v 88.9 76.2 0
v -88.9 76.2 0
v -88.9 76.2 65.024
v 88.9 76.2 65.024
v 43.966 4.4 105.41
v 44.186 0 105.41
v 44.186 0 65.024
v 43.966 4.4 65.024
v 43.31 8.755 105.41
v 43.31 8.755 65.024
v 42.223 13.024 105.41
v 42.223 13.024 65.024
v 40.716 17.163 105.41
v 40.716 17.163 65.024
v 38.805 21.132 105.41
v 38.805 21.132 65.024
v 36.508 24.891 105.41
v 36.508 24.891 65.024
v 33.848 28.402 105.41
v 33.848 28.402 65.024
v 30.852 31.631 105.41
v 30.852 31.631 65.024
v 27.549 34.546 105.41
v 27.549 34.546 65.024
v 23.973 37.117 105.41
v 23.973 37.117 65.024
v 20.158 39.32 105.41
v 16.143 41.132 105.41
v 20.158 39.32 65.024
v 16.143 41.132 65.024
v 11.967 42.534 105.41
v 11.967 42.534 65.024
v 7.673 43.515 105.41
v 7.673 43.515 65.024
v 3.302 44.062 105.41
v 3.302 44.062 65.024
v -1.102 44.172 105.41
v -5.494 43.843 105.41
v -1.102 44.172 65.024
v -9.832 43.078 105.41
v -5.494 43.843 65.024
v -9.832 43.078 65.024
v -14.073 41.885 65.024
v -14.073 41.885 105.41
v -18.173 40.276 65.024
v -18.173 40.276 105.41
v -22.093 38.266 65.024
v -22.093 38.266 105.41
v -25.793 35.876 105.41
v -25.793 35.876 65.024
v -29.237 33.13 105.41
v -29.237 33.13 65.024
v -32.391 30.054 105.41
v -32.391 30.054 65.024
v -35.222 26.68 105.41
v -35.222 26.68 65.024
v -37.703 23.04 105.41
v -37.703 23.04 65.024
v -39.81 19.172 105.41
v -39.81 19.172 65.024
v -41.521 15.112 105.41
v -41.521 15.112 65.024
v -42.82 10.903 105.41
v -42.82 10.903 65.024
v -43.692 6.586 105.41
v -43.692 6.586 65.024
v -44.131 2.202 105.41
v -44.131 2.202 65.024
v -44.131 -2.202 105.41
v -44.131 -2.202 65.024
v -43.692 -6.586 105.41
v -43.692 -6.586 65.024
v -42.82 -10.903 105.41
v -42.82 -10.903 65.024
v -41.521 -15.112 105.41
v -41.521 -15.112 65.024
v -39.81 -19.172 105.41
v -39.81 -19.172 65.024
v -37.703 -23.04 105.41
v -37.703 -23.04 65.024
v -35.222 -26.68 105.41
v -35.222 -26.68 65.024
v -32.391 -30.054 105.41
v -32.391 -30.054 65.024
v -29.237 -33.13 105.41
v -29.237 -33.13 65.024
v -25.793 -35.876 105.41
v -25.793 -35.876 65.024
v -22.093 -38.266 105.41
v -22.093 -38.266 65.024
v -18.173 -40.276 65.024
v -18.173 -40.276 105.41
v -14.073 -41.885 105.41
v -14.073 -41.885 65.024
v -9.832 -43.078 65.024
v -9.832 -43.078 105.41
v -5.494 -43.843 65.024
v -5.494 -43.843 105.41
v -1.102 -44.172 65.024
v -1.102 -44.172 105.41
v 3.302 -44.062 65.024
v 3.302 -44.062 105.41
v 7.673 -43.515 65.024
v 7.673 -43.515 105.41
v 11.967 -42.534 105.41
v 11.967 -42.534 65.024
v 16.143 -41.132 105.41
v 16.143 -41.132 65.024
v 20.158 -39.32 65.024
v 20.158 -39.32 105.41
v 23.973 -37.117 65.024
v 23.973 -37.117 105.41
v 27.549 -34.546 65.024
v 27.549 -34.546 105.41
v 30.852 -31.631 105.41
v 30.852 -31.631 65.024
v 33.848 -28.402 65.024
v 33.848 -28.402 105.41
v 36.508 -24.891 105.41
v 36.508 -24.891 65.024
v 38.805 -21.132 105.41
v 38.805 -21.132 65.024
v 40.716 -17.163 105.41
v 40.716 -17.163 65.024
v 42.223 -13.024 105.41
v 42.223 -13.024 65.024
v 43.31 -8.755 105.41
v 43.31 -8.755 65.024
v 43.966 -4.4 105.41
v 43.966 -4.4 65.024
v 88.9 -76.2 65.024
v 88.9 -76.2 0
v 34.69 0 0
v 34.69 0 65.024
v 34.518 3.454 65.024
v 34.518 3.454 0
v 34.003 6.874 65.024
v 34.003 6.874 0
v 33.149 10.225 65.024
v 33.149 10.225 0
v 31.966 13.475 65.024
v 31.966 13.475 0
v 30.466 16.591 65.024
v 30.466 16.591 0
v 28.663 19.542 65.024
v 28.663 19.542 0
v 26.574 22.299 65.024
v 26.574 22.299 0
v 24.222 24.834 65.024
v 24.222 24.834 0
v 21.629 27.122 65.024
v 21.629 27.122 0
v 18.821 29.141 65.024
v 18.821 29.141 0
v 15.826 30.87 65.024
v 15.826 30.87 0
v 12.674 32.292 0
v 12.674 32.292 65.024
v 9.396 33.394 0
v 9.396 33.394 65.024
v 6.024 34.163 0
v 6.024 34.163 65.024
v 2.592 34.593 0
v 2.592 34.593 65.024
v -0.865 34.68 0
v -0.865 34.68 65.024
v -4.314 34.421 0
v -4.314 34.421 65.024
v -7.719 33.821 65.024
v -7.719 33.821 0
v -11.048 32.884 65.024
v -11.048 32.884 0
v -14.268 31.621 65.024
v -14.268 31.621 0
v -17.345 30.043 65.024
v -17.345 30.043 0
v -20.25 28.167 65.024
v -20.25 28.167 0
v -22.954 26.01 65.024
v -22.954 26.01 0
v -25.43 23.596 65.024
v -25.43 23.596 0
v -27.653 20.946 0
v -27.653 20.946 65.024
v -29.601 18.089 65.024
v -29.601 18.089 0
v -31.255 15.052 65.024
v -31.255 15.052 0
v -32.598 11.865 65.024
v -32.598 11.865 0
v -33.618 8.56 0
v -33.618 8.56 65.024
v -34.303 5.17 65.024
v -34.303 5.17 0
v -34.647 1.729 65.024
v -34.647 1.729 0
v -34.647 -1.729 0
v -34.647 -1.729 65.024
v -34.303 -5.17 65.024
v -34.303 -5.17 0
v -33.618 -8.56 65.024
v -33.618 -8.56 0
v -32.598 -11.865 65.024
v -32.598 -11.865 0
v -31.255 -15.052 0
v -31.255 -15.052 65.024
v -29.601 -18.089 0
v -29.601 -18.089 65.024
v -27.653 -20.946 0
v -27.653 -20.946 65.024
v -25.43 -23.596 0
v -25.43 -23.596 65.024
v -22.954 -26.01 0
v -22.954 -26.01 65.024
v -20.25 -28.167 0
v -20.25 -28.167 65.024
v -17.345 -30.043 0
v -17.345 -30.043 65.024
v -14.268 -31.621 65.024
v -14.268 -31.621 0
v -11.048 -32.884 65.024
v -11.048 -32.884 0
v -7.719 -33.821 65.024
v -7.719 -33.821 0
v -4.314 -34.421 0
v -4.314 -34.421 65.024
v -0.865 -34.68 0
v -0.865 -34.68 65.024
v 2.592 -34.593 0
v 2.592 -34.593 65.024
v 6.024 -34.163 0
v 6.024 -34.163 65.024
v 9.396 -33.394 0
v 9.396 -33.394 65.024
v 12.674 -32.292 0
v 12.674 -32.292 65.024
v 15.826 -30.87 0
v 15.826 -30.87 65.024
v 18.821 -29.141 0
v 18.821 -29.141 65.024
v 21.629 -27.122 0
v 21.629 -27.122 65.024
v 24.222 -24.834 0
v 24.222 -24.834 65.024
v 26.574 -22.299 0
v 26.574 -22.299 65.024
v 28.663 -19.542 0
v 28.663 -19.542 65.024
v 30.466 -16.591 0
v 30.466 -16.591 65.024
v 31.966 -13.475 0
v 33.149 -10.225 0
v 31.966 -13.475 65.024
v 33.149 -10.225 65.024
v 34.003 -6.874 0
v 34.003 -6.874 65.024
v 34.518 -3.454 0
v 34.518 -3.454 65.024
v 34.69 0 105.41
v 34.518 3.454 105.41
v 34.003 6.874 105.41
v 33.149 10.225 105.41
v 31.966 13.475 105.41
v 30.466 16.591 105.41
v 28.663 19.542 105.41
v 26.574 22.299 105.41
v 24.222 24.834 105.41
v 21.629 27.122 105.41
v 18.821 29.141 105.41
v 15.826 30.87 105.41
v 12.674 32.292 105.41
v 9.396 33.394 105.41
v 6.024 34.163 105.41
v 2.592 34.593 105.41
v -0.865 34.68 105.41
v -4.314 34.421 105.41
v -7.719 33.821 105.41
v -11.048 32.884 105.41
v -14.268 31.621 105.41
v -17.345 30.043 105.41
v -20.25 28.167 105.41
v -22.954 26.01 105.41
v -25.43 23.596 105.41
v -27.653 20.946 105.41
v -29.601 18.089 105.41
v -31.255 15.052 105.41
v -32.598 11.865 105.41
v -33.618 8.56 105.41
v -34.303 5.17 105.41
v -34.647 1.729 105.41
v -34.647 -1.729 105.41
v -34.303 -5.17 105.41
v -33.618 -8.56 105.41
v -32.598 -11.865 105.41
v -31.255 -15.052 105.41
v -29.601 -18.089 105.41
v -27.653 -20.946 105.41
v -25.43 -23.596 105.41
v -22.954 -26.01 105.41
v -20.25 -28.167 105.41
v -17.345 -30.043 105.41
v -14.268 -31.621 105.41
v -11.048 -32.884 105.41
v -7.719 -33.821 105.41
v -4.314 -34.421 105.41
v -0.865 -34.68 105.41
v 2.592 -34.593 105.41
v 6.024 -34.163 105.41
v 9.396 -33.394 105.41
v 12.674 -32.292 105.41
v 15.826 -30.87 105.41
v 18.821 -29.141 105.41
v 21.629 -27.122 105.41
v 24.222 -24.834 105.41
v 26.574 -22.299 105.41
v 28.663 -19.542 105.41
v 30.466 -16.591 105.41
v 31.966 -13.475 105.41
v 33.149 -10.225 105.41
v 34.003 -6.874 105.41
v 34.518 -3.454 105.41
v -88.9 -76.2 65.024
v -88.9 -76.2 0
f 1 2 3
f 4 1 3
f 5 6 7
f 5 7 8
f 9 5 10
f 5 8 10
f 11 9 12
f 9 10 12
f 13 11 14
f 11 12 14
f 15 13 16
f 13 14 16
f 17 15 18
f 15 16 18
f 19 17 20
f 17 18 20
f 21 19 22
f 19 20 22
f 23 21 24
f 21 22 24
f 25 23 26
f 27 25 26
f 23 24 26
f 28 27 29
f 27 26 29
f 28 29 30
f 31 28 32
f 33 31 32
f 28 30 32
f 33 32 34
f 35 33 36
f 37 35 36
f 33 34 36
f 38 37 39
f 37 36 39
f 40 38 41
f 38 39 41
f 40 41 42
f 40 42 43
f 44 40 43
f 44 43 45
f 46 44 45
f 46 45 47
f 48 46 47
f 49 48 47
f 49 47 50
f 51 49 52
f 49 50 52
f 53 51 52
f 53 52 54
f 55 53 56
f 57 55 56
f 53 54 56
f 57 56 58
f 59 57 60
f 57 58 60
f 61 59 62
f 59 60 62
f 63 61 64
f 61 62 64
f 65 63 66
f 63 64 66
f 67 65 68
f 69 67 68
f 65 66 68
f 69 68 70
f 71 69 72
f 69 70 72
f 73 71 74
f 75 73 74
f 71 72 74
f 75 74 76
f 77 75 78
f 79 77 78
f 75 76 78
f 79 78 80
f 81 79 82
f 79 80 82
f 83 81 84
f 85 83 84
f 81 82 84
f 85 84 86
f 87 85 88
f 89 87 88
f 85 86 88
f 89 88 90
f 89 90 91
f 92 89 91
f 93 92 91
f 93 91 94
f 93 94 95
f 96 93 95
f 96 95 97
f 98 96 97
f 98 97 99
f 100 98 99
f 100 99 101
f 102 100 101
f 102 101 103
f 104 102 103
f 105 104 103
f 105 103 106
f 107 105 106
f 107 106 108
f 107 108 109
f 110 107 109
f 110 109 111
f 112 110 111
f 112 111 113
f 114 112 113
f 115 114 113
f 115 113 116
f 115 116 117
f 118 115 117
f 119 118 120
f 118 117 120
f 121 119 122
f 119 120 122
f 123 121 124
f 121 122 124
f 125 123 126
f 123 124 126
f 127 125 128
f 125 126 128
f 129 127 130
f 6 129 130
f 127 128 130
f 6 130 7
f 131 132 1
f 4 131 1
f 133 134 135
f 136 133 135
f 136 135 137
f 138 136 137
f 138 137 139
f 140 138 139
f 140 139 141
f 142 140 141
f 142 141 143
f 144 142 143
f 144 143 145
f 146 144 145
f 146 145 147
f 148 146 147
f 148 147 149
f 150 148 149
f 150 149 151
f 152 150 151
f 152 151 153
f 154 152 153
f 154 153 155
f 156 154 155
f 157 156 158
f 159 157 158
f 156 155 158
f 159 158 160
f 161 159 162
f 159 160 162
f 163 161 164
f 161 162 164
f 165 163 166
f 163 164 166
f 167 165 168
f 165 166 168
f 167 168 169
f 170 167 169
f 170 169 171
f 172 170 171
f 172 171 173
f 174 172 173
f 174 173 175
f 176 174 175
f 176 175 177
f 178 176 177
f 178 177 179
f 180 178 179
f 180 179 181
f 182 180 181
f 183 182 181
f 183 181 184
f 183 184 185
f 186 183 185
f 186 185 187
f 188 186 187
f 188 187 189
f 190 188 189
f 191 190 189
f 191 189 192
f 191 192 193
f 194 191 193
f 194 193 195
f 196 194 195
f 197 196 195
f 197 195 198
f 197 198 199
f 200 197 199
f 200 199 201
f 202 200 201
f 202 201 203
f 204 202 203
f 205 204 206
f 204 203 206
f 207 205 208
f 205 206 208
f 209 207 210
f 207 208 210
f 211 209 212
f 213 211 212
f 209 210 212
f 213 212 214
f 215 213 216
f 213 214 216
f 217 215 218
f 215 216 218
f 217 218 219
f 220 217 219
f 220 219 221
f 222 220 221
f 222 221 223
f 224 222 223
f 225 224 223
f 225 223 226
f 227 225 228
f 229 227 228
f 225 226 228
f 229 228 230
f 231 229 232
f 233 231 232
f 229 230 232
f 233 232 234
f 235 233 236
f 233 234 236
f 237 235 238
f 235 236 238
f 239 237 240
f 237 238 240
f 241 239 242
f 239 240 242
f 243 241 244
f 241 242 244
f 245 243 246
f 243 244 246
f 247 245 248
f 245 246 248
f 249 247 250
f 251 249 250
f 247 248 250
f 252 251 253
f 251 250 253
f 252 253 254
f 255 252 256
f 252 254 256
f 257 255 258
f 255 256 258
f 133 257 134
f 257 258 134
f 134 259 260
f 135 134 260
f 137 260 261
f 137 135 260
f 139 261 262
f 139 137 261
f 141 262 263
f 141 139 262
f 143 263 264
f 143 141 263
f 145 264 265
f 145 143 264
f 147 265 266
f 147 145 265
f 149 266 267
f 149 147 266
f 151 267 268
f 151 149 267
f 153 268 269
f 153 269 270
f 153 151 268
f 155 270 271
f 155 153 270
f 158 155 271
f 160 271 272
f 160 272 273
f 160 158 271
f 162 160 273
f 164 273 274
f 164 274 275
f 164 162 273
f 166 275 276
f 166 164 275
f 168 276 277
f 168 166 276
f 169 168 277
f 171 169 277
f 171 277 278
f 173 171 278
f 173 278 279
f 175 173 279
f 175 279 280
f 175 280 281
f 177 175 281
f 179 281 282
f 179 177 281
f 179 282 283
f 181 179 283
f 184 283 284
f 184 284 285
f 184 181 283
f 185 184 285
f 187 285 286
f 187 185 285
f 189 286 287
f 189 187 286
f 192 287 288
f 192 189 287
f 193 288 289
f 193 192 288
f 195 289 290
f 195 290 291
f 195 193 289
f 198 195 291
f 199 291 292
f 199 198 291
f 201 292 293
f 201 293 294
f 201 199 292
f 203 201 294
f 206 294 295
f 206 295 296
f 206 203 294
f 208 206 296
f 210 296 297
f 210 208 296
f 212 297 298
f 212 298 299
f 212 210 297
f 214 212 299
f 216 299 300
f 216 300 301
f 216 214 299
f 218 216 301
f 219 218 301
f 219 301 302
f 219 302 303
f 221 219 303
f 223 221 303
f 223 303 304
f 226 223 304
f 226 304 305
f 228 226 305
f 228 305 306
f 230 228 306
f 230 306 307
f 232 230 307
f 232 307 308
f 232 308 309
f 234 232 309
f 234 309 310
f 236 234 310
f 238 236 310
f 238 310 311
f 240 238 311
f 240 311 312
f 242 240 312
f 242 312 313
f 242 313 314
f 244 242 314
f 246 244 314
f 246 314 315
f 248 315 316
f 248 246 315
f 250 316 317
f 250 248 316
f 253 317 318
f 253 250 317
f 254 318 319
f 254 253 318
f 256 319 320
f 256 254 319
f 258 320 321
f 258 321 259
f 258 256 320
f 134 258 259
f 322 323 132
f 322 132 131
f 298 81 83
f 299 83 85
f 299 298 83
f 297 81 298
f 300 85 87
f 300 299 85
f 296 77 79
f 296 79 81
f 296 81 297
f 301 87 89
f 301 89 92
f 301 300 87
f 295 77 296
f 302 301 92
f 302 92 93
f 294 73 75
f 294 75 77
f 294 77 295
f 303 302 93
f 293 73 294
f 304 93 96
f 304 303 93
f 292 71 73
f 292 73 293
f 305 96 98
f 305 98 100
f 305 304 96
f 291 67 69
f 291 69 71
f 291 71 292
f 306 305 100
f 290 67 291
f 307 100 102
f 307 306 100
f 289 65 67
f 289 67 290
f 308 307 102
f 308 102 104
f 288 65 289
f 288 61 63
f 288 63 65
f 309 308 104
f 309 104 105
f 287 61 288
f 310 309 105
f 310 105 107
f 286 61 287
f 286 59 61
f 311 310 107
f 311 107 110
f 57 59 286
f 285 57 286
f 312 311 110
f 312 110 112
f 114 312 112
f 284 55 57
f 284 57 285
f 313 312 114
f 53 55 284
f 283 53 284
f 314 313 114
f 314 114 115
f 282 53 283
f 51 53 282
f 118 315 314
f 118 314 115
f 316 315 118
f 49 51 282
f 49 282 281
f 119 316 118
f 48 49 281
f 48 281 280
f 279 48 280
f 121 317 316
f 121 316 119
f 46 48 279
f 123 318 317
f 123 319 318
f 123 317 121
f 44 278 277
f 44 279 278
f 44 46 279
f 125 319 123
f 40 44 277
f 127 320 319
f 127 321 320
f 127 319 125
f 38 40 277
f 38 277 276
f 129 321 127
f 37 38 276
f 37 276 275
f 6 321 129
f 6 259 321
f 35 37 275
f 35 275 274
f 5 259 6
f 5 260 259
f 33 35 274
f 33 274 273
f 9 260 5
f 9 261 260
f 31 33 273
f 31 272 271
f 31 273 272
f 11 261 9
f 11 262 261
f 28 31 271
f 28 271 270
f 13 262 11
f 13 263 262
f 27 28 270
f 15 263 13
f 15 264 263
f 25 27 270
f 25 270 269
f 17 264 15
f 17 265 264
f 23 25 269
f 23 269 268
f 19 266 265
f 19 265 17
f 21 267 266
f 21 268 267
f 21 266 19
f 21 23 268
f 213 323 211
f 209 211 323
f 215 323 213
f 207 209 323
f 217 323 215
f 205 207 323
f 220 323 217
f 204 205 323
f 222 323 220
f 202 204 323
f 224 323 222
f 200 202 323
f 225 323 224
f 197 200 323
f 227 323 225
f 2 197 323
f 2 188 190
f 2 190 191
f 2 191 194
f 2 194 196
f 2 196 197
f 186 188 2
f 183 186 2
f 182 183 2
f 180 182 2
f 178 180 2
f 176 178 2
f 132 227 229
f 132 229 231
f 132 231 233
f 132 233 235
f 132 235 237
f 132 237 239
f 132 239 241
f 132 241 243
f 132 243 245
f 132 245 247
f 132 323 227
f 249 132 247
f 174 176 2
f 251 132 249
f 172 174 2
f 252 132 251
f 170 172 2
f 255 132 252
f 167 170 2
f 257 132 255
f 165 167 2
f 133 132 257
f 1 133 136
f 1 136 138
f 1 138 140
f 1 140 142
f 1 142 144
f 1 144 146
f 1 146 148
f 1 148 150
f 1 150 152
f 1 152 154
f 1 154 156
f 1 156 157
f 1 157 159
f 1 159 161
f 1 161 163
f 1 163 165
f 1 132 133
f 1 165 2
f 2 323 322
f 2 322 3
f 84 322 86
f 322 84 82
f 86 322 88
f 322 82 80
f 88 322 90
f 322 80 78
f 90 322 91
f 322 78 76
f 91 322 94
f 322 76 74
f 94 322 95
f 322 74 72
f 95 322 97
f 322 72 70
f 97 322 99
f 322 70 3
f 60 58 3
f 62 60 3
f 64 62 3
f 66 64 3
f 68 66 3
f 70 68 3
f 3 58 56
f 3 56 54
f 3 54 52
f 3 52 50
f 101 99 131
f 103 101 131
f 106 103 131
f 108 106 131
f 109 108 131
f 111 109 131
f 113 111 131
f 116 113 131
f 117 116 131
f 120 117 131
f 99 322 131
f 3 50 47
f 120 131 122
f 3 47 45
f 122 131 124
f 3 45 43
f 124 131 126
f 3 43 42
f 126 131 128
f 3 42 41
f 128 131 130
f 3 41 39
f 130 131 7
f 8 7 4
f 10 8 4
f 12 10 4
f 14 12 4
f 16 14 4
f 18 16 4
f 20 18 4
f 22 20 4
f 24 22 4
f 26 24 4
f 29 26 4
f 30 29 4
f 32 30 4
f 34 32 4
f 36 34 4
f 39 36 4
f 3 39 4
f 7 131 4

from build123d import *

# Parameters (mm, degrees)
F0_W     = 152.4
F0_H     = 152.4
F1_DEPTH = 65.024
F2_R     = 34.6904695034
F3_DEPTH = 125.984
F4_R     = 44.1859582528
F4_R_2   = 34.6904695034
F5_DEPTH = 40.386
F6_DEPTH = 12.7
F7_DEPTH = 12.7


with BuildPart() as f1:
    # F0 (on Top) → F1 (new body)
    with BuildSketch(Plane.XY):
        Rectangle(F0_W, F0_H)
    extrude(amount=F1_DEPTH)

    # F2 (on face) → F3 (cut)
    with BuildSketch(Plane.XY.offset(65.024)):
        Circle(F2_R)
    extrude(amount=-F3_DEPTH, mode=Mode.SUBTRACT)

    # F4 (on face) → F5 (join)
    with BuildSketch(Plane.XY.offset(65.024)):
        Circle(F4_R)
        Circle(F4_R_2, mode=Mode.SUBTRACT)
    extrude(amount=F5_DEPTH)

    # F6 (add): a face of the model
    f6_faces = [f1.faces().sort_by_distance(p)[0] for p in [
        (76.2, 0, 32.512),
    ]]
    extrude(f6_faces, amount=F6_DEPTH)

    # F7 (add): a face of the model
    f7_faces = [f1.faces().sort_by_distance(p)[0] for p in [
        (-76.2, 0, 32.512),
    ]]
    extrude(f7_faces, amount=F7_DEPTH)


solid = f1.part
